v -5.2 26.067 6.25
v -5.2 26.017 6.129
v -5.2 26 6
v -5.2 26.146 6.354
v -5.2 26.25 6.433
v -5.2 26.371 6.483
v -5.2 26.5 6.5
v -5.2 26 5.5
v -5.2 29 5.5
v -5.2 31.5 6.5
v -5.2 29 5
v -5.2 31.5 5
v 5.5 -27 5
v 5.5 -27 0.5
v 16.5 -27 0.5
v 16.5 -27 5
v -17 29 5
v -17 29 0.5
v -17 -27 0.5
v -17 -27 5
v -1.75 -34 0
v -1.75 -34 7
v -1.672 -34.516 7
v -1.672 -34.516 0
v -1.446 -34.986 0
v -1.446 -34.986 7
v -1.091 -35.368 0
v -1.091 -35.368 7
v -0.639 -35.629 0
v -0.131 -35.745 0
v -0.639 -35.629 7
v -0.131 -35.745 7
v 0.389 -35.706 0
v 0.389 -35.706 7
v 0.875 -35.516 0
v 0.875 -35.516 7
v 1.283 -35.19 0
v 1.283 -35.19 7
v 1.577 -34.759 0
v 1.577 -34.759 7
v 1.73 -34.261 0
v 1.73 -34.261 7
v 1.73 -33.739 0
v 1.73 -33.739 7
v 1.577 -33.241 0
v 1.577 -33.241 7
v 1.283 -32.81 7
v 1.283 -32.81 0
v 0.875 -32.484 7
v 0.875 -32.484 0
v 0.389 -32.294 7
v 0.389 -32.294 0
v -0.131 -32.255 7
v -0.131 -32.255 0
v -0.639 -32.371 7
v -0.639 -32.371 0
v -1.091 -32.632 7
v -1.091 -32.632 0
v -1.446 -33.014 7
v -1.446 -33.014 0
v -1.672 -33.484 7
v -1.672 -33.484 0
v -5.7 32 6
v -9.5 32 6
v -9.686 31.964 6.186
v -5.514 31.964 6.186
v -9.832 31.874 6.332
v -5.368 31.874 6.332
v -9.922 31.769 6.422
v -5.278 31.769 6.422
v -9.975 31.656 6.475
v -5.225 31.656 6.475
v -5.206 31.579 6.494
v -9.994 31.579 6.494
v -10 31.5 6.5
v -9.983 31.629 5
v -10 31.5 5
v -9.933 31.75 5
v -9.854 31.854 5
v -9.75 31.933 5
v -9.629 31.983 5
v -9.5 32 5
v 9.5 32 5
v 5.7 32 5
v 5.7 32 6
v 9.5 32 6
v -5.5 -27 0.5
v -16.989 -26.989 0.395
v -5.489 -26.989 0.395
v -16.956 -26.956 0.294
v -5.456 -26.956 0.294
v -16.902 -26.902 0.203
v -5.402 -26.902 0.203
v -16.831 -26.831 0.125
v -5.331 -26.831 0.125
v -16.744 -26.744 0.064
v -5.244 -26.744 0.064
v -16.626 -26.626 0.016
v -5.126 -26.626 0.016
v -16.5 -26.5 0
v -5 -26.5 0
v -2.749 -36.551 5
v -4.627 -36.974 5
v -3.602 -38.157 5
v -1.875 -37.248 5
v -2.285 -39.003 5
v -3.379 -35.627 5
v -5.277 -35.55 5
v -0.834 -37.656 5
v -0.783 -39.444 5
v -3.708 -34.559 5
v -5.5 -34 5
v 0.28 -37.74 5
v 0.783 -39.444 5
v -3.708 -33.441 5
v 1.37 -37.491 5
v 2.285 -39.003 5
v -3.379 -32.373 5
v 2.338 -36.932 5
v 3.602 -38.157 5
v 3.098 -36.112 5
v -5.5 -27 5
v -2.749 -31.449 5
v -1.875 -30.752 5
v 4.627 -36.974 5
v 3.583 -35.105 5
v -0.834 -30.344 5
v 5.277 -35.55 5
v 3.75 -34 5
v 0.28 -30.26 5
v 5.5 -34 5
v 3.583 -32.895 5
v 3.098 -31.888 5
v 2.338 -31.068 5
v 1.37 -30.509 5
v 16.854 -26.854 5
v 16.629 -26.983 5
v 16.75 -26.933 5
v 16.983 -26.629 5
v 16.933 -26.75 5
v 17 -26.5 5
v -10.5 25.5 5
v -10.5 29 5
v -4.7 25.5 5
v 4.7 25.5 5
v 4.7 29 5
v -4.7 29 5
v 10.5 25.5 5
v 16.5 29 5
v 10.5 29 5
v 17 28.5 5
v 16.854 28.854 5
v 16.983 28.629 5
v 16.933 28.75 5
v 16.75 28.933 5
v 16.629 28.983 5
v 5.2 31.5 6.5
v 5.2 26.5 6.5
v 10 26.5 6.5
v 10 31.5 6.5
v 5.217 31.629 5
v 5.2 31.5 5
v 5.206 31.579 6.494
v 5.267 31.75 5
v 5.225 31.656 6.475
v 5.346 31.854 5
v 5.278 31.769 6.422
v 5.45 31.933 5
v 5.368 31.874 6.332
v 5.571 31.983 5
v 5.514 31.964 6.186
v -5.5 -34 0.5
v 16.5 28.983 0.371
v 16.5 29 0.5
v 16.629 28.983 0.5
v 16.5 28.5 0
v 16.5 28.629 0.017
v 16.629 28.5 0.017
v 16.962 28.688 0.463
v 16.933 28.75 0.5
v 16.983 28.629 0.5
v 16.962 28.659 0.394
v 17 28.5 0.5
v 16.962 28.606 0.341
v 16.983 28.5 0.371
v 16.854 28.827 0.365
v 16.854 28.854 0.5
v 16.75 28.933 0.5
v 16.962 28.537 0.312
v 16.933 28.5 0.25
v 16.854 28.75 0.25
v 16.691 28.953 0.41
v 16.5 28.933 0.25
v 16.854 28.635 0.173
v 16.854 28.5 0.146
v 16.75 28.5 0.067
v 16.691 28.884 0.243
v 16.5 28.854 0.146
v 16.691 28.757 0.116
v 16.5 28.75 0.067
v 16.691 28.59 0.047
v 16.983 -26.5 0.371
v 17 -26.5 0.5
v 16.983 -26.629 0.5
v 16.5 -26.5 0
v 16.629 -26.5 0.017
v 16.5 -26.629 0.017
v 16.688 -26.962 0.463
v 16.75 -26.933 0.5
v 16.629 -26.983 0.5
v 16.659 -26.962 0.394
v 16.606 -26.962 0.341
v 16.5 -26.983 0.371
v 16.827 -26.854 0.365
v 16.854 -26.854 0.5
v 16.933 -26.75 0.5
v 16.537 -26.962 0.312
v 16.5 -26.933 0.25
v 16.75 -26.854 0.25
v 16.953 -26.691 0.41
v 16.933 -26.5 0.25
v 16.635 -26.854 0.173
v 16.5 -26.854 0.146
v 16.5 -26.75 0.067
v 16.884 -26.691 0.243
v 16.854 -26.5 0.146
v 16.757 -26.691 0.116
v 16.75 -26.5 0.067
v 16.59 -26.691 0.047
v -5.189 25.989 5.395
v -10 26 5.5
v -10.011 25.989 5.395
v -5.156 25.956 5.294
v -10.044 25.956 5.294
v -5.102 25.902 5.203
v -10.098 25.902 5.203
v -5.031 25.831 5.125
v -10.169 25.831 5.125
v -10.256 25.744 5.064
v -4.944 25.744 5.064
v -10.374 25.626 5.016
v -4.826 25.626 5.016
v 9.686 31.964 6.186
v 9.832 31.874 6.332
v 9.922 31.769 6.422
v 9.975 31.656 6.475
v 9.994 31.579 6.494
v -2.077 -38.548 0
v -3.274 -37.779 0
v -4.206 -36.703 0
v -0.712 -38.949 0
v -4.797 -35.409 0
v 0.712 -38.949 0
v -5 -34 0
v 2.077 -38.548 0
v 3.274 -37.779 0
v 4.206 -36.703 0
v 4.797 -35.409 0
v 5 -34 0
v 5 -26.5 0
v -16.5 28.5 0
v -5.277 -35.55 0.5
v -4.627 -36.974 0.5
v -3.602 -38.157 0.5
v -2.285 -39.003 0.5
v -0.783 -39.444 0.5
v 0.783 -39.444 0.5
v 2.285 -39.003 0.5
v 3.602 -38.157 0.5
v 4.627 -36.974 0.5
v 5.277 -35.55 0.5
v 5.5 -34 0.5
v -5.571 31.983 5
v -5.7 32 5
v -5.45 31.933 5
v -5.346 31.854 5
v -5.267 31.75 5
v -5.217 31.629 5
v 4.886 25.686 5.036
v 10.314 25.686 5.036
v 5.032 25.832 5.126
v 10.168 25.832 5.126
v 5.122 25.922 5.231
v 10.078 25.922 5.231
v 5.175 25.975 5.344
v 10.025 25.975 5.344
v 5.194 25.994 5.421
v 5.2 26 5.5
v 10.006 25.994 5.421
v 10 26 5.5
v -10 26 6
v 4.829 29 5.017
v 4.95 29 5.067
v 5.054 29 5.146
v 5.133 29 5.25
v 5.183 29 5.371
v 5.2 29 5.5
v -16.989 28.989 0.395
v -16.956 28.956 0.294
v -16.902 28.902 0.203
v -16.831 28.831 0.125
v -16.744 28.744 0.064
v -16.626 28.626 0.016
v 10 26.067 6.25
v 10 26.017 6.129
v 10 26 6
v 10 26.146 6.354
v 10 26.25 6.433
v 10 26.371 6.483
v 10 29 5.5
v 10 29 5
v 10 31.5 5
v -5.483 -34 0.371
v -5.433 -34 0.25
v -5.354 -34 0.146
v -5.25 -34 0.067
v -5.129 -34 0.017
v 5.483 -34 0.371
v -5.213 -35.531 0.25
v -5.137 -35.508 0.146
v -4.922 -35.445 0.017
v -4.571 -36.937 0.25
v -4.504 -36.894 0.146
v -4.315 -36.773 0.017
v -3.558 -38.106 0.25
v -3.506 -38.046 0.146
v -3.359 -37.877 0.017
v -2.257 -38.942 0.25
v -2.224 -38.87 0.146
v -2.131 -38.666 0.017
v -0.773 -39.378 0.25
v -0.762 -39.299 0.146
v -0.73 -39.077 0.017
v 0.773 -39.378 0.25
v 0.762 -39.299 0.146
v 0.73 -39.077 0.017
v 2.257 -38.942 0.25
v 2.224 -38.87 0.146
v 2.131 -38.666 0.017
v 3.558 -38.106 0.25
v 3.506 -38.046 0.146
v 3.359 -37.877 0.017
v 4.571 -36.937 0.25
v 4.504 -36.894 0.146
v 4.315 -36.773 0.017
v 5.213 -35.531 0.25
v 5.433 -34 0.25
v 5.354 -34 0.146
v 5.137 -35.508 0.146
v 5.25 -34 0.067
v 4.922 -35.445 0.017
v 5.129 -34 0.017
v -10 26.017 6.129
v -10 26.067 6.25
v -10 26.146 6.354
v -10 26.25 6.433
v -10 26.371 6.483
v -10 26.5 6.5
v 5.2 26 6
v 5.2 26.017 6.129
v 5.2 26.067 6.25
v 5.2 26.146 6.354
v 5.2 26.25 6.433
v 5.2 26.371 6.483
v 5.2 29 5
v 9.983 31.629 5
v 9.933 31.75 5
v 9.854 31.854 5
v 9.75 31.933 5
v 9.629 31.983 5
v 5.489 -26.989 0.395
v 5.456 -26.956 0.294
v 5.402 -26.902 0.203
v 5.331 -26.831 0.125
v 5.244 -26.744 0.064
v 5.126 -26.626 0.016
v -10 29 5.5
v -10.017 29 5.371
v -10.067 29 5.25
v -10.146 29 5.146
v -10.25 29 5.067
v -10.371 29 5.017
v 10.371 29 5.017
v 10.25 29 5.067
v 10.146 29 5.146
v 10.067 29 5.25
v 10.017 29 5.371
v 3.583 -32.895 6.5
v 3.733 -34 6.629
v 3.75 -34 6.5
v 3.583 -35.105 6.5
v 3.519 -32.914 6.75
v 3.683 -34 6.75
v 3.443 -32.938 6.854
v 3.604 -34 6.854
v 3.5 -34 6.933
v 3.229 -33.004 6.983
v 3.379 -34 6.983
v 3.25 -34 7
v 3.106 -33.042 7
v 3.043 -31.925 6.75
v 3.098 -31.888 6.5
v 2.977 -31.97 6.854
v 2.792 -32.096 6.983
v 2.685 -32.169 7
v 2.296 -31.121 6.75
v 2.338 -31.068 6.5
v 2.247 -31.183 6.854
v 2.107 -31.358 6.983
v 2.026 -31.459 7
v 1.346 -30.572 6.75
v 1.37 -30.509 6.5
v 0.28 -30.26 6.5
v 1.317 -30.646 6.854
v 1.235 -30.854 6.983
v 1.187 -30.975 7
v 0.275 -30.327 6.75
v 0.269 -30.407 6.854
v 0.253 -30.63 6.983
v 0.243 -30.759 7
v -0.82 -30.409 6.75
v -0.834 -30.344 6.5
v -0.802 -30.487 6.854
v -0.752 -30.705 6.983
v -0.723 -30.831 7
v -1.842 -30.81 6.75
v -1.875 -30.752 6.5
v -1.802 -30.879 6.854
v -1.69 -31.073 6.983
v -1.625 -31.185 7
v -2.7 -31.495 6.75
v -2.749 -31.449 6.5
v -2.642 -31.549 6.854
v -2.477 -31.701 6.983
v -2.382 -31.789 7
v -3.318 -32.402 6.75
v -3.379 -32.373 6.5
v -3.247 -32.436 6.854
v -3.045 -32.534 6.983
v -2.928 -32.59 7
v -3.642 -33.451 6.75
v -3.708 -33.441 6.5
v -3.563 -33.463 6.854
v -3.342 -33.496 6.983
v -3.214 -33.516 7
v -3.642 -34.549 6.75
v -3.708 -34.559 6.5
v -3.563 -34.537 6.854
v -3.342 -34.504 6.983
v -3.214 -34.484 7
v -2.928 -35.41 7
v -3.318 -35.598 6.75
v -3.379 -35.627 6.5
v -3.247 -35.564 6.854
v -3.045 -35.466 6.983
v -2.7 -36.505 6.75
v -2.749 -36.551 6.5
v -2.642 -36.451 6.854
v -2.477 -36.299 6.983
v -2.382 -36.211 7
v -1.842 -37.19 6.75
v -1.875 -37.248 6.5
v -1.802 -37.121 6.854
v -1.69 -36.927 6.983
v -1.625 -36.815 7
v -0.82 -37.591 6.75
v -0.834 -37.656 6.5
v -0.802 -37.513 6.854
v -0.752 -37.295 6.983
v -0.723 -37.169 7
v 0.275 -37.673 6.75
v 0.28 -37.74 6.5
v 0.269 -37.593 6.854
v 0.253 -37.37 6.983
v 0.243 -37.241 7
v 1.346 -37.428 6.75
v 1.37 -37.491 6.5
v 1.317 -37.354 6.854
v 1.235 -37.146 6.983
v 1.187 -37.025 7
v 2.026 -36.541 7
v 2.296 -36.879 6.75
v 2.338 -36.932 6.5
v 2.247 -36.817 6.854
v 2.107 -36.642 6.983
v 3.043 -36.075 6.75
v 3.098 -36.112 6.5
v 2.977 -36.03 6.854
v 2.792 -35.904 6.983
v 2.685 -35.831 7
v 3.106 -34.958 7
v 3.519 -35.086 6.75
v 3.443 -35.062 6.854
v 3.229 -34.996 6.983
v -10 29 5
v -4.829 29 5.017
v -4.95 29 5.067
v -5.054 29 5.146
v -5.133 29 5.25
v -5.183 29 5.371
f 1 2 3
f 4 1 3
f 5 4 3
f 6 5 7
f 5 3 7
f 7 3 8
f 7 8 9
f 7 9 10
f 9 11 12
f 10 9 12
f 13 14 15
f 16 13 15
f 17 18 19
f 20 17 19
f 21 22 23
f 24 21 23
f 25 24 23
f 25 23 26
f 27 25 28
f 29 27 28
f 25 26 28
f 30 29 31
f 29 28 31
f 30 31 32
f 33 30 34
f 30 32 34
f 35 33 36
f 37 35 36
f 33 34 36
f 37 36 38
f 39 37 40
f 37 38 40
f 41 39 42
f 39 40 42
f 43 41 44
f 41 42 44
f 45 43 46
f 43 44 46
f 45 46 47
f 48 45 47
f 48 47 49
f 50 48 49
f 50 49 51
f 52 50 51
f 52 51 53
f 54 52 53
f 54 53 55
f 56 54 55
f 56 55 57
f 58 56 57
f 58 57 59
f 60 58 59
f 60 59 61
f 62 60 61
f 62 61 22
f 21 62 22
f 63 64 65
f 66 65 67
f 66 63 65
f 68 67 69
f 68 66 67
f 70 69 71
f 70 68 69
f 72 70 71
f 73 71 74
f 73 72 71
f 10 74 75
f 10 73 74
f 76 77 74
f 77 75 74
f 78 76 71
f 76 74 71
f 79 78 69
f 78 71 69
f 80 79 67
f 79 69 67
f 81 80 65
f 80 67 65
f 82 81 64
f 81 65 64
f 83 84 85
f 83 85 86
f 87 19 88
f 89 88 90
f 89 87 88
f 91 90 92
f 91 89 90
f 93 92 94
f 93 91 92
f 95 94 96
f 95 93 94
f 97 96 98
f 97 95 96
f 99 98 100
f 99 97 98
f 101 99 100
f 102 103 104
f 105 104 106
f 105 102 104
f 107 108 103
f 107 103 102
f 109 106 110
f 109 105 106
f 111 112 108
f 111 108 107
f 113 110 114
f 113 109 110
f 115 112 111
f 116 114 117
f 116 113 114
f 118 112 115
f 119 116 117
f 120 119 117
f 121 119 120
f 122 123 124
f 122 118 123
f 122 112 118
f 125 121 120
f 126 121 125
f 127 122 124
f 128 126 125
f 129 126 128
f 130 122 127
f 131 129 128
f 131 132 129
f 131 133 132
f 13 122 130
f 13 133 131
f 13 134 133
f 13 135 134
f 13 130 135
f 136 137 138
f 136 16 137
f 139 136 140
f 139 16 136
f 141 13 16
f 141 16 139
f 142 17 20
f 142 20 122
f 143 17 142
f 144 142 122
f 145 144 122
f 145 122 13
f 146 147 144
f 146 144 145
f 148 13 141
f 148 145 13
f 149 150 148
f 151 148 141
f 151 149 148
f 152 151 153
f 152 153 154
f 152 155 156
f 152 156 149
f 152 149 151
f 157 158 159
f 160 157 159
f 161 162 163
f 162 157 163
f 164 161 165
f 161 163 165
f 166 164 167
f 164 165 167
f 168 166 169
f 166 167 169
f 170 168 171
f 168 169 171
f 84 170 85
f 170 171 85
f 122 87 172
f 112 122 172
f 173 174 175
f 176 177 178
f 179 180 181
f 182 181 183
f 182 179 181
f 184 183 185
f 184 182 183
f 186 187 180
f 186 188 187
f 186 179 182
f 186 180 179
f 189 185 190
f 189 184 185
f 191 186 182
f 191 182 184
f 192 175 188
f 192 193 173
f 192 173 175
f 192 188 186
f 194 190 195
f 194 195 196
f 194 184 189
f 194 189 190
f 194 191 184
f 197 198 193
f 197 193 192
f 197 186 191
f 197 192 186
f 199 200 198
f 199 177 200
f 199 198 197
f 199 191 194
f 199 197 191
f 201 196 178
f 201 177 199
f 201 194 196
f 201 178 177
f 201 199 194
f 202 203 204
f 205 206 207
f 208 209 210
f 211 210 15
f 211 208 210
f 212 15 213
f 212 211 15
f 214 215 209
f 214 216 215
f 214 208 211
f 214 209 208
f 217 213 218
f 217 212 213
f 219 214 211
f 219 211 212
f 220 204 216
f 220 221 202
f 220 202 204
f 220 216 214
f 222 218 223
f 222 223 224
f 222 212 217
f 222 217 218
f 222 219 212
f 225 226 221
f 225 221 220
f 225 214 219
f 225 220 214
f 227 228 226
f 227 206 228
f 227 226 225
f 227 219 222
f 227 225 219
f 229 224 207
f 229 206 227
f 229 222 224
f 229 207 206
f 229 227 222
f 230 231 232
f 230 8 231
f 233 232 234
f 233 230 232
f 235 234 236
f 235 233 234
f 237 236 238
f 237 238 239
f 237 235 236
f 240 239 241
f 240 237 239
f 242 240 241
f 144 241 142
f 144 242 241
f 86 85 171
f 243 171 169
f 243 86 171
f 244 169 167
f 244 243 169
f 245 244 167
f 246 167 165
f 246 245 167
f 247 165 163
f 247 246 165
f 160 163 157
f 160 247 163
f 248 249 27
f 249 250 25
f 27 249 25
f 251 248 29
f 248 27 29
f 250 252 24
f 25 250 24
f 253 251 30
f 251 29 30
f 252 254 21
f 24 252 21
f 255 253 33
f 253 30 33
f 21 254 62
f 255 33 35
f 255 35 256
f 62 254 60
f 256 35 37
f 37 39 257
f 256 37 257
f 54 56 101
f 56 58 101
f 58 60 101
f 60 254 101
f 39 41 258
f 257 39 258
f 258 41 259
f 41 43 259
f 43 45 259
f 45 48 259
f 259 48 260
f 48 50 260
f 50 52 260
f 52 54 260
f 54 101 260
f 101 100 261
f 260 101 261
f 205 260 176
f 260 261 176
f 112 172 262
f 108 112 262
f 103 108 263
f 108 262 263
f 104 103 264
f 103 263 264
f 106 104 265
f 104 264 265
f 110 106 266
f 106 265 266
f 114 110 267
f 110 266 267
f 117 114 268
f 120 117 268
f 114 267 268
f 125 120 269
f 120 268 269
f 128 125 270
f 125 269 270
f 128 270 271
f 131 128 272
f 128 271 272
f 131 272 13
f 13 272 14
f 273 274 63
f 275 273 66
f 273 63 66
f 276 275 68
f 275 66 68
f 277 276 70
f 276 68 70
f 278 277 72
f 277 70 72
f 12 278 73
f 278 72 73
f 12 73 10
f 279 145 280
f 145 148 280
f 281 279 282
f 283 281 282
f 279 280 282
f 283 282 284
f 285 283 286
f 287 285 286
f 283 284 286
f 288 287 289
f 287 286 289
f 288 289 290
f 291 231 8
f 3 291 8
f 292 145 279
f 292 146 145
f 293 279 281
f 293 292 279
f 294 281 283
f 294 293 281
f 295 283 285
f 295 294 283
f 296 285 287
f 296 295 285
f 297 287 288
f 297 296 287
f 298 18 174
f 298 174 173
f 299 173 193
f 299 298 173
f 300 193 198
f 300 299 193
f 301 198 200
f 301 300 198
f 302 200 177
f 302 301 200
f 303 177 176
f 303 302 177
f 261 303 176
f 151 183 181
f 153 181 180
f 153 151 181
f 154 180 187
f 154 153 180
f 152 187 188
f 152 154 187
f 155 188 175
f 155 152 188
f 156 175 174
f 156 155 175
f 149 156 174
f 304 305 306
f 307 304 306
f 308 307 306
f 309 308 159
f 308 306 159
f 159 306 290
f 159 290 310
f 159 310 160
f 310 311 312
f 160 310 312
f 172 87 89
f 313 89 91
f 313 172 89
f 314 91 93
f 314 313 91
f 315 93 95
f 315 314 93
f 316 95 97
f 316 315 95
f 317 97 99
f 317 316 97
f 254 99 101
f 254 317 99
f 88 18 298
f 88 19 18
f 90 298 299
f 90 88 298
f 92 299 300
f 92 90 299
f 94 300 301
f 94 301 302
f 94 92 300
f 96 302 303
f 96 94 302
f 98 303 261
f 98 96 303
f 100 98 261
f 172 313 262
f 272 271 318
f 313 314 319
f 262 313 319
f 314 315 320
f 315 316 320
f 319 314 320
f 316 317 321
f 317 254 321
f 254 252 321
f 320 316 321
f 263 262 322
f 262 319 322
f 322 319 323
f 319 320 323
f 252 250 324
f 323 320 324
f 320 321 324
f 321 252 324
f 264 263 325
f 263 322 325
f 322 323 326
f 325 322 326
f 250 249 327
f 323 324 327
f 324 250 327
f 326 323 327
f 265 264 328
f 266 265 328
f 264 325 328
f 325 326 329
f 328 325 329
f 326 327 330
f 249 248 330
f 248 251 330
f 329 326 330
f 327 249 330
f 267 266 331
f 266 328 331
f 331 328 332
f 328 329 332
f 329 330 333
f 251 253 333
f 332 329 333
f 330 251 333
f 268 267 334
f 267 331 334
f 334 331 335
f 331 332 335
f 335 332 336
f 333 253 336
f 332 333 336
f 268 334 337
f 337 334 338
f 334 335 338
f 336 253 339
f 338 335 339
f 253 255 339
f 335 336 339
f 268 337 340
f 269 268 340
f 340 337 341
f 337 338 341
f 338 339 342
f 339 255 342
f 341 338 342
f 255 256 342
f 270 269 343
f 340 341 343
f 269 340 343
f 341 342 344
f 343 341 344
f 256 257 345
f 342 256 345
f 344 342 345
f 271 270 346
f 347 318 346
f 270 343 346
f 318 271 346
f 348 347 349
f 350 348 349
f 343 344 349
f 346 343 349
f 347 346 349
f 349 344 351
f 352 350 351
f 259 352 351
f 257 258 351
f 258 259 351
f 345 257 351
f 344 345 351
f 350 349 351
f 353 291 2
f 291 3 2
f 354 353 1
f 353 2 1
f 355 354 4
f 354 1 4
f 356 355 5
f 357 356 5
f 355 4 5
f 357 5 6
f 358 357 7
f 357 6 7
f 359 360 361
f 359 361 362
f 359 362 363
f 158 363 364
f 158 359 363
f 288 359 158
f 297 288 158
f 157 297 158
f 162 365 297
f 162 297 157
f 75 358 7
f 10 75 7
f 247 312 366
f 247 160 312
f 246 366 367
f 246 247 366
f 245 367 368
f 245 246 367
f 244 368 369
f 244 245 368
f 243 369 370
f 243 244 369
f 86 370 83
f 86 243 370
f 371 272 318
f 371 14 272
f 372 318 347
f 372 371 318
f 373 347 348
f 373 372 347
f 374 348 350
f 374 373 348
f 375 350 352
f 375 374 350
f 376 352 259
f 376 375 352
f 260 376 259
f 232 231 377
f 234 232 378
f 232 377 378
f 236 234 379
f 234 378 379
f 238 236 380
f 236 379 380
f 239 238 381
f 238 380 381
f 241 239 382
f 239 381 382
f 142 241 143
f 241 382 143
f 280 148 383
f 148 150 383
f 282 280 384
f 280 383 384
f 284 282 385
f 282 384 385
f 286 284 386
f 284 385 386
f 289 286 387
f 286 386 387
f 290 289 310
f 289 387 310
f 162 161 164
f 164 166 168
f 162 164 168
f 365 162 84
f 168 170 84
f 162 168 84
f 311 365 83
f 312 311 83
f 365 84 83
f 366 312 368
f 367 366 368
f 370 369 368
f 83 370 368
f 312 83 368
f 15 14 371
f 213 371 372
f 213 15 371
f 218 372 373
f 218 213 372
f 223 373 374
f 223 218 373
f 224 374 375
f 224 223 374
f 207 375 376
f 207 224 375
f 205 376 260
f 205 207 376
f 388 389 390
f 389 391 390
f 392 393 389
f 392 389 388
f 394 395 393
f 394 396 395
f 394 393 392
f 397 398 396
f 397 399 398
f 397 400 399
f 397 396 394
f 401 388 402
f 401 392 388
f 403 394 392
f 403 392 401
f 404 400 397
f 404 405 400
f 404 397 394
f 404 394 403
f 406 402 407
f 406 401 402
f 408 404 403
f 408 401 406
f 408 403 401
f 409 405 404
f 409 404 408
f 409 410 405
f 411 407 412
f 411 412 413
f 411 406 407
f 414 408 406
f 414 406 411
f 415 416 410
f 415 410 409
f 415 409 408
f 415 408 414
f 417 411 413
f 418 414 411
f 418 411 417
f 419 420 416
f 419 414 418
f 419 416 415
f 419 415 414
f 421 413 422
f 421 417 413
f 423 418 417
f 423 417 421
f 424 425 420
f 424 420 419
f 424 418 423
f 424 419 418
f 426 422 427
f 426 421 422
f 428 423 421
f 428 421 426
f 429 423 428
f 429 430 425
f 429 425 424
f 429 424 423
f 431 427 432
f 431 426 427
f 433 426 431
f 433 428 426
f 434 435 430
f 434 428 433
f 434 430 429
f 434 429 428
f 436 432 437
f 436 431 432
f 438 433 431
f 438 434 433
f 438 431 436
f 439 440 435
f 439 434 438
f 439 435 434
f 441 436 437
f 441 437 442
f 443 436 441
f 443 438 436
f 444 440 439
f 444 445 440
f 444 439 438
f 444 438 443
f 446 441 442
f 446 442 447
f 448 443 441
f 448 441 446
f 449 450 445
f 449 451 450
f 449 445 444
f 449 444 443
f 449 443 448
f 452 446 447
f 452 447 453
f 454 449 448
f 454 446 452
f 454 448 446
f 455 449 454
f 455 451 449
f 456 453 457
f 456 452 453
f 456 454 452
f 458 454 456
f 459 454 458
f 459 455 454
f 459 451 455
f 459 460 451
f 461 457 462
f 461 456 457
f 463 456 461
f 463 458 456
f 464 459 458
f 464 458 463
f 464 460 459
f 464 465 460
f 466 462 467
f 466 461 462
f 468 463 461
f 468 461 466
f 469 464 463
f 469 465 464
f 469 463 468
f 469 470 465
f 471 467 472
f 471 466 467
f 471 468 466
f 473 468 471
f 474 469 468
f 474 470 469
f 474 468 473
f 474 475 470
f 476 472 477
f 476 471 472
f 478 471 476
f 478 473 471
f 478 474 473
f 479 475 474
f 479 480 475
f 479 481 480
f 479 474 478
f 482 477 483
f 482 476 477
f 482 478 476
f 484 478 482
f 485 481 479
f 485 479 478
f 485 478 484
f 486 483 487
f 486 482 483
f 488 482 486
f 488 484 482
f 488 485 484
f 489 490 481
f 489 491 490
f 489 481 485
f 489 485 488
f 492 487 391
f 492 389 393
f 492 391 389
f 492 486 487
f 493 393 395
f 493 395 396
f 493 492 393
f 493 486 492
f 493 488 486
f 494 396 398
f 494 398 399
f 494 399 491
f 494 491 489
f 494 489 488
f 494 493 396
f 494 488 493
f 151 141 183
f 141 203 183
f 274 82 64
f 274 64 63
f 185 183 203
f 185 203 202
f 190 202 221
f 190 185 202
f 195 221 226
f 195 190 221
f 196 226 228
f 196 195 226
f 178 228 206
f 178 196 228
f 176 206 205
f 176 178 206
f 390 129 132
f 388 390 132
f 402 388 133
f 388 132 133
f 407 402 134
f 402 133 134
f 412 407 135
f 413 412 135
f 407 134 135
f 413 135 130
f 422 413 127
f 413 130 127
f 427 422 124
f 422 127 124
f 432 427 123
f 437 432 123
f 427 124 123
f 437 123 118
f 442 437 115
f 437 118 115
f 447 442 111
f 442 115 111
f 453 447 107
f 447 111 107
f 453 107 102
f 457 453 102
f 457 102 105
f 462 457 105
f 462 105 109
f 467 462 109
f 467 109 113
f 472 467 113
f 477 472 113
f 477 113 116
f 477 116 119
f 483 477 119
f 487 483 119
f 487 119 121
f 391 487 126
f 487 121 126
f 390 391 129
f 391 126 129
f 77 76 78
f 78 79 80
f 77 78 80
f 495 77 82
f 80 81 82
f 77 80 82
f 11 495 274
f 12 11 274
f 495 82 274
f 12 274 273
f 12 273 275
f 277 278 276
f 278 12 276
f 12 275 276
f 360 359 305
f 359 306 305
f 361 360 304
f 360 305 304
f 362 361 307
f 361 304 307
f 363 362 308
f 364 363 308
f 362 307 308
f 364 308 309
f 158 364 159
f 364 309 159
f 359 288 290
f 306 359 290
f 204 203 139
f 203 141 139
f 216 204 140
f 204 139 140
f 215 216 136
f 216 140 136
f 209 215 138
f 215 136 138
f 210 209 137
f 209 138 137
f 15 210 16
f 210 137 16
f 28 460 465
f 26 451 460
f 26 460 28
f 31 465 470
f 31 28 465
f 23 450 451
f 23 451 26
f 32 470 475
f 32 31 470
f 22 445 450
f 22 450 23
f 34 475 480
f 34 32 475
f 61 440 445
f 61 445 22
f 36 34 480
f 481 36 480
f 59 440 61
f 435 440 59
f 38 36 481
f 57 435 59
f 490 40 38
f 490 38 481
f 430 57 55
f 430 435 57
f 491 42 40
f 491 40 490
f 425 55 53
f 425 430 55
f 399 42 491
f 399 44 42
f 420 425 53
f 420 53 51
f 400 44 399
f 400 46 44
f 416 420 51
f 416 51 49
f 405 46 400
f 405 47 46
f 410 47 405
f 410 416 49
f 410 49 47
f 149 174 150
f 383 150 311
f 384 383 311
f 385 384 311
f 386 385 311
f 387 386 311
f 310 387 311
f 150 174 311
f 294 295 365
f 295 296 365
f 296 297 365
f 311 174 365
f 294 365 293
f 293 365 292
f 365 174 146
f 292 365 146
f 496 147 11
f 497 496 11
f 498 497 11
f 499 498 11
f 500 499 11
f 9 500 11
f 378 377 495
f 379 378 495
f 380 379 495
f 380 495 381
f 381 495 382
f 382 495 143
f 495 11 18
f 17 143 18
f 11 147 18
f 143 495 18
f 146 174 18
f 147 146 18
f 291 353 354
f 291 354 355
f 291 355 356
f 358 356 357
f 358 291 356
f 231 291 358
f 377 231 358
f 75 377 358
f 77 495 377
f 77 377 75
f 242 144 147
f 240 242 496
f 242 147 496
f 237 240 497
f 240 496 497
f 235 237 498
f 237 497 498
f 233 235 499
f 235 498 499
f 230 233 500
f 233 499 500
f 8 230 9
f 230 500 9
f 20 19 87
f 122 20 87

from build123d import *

# Parameters (mm, degrees)
F1_DEPTH = 5
F2_R     = 3.75
F3_DEPTH = 2
F4_D     = 3.5
F5_W     = 4.8
F5_H     = 6
F6_DEPTH = 1.5
F7_R     = 0.5


with BuildPart() as f1:
    # F0 (on Top) → F1 (new body)
    with BuildSketch(Plane.XY):
        Polygon((17, 29), (-17, 29), (-17, -27), (-5.5, -27), (5.5, -27), (17, -27), align=None)
        with BuildLine():
            Line((5.5, -27), (-5.5, -27))
            Line((-5.5, -27), (-5.5, -34))
            ThreePointArc((-5.5, -34), (0, -28.5), (5.5, -34))
            Line((5.5, -34), (5.5, -27))
        make_face()
        with BuildLine():
            ThreePointArc((5.5, -34), (0, -28.5), (-5.5, -34))
            ThreePointArc((-5.5, -34), (0, -39.5), (5.5, -34))
        make_face()
    extrude(amount=F1_DEPTH)

    # F2 (on face) → F3 (join)
    with BuildSketch(Plane.XY.offset(5)):
        with Locations((0, -34)):
            Circle(F2_R)
    extrude(amount=F3_DEPTH)

    # F4 (through all)
    with Locations(Plane(origin=(0, 0, 0), x_dir=(1, 0, 0), z_dir=(0, 0, -1))):
        with Locations((0, 34)):
            Hole(F4_D / 2)

    # F5 (on face) → F6 (join)
    with BuildSketch(Plane.XY.offset(5)):
        with Locations((-7.6, 29)):
            Rectangle(F5_W, F5_H)
        with Locations((7.6, 29)):
            Rectangle(F5_W, F5_H)
    extrude(amount=F6_DEPTH)

    # F7
    f7_edges = [f1.edges().sort_by_distance(p)[0] for p in [
        (7.6, 26, 6.5),
        (-7.6, 26, 6.5),
        (-7.6, 32, 6.5),
        (7.6, 32, 6.5),
        (0, 29, 0),
        (17, 29, 2.5),
        (17, 1, 0),
        (17, -27, 2.5),
        (5.5, -30.5, 0),
        (0, -39.5, 0),
        (-3.75, -34, 7),
        (11.25, -27, 0),
        (-11.25, -27, 0),
        (-17, 1, 0),
        (10, 32, 5.75),
        (5.2, 32, 5.75),
        (-5.2, 32, 5.75),
        (-10, 32, 5.75),
        (-7.6, 26, 5),
        (7.6, 26, 5),
        (5.2, 27.5, 5),
        (-10, 27.5, 5),
        (-5.2, 27.5, 5),
        (10, 27.5, 5),
        (-5.5, -30.5, 0),
    ]]
    fillet(f7_edges, radius=F7_R)


solid = f1.part
